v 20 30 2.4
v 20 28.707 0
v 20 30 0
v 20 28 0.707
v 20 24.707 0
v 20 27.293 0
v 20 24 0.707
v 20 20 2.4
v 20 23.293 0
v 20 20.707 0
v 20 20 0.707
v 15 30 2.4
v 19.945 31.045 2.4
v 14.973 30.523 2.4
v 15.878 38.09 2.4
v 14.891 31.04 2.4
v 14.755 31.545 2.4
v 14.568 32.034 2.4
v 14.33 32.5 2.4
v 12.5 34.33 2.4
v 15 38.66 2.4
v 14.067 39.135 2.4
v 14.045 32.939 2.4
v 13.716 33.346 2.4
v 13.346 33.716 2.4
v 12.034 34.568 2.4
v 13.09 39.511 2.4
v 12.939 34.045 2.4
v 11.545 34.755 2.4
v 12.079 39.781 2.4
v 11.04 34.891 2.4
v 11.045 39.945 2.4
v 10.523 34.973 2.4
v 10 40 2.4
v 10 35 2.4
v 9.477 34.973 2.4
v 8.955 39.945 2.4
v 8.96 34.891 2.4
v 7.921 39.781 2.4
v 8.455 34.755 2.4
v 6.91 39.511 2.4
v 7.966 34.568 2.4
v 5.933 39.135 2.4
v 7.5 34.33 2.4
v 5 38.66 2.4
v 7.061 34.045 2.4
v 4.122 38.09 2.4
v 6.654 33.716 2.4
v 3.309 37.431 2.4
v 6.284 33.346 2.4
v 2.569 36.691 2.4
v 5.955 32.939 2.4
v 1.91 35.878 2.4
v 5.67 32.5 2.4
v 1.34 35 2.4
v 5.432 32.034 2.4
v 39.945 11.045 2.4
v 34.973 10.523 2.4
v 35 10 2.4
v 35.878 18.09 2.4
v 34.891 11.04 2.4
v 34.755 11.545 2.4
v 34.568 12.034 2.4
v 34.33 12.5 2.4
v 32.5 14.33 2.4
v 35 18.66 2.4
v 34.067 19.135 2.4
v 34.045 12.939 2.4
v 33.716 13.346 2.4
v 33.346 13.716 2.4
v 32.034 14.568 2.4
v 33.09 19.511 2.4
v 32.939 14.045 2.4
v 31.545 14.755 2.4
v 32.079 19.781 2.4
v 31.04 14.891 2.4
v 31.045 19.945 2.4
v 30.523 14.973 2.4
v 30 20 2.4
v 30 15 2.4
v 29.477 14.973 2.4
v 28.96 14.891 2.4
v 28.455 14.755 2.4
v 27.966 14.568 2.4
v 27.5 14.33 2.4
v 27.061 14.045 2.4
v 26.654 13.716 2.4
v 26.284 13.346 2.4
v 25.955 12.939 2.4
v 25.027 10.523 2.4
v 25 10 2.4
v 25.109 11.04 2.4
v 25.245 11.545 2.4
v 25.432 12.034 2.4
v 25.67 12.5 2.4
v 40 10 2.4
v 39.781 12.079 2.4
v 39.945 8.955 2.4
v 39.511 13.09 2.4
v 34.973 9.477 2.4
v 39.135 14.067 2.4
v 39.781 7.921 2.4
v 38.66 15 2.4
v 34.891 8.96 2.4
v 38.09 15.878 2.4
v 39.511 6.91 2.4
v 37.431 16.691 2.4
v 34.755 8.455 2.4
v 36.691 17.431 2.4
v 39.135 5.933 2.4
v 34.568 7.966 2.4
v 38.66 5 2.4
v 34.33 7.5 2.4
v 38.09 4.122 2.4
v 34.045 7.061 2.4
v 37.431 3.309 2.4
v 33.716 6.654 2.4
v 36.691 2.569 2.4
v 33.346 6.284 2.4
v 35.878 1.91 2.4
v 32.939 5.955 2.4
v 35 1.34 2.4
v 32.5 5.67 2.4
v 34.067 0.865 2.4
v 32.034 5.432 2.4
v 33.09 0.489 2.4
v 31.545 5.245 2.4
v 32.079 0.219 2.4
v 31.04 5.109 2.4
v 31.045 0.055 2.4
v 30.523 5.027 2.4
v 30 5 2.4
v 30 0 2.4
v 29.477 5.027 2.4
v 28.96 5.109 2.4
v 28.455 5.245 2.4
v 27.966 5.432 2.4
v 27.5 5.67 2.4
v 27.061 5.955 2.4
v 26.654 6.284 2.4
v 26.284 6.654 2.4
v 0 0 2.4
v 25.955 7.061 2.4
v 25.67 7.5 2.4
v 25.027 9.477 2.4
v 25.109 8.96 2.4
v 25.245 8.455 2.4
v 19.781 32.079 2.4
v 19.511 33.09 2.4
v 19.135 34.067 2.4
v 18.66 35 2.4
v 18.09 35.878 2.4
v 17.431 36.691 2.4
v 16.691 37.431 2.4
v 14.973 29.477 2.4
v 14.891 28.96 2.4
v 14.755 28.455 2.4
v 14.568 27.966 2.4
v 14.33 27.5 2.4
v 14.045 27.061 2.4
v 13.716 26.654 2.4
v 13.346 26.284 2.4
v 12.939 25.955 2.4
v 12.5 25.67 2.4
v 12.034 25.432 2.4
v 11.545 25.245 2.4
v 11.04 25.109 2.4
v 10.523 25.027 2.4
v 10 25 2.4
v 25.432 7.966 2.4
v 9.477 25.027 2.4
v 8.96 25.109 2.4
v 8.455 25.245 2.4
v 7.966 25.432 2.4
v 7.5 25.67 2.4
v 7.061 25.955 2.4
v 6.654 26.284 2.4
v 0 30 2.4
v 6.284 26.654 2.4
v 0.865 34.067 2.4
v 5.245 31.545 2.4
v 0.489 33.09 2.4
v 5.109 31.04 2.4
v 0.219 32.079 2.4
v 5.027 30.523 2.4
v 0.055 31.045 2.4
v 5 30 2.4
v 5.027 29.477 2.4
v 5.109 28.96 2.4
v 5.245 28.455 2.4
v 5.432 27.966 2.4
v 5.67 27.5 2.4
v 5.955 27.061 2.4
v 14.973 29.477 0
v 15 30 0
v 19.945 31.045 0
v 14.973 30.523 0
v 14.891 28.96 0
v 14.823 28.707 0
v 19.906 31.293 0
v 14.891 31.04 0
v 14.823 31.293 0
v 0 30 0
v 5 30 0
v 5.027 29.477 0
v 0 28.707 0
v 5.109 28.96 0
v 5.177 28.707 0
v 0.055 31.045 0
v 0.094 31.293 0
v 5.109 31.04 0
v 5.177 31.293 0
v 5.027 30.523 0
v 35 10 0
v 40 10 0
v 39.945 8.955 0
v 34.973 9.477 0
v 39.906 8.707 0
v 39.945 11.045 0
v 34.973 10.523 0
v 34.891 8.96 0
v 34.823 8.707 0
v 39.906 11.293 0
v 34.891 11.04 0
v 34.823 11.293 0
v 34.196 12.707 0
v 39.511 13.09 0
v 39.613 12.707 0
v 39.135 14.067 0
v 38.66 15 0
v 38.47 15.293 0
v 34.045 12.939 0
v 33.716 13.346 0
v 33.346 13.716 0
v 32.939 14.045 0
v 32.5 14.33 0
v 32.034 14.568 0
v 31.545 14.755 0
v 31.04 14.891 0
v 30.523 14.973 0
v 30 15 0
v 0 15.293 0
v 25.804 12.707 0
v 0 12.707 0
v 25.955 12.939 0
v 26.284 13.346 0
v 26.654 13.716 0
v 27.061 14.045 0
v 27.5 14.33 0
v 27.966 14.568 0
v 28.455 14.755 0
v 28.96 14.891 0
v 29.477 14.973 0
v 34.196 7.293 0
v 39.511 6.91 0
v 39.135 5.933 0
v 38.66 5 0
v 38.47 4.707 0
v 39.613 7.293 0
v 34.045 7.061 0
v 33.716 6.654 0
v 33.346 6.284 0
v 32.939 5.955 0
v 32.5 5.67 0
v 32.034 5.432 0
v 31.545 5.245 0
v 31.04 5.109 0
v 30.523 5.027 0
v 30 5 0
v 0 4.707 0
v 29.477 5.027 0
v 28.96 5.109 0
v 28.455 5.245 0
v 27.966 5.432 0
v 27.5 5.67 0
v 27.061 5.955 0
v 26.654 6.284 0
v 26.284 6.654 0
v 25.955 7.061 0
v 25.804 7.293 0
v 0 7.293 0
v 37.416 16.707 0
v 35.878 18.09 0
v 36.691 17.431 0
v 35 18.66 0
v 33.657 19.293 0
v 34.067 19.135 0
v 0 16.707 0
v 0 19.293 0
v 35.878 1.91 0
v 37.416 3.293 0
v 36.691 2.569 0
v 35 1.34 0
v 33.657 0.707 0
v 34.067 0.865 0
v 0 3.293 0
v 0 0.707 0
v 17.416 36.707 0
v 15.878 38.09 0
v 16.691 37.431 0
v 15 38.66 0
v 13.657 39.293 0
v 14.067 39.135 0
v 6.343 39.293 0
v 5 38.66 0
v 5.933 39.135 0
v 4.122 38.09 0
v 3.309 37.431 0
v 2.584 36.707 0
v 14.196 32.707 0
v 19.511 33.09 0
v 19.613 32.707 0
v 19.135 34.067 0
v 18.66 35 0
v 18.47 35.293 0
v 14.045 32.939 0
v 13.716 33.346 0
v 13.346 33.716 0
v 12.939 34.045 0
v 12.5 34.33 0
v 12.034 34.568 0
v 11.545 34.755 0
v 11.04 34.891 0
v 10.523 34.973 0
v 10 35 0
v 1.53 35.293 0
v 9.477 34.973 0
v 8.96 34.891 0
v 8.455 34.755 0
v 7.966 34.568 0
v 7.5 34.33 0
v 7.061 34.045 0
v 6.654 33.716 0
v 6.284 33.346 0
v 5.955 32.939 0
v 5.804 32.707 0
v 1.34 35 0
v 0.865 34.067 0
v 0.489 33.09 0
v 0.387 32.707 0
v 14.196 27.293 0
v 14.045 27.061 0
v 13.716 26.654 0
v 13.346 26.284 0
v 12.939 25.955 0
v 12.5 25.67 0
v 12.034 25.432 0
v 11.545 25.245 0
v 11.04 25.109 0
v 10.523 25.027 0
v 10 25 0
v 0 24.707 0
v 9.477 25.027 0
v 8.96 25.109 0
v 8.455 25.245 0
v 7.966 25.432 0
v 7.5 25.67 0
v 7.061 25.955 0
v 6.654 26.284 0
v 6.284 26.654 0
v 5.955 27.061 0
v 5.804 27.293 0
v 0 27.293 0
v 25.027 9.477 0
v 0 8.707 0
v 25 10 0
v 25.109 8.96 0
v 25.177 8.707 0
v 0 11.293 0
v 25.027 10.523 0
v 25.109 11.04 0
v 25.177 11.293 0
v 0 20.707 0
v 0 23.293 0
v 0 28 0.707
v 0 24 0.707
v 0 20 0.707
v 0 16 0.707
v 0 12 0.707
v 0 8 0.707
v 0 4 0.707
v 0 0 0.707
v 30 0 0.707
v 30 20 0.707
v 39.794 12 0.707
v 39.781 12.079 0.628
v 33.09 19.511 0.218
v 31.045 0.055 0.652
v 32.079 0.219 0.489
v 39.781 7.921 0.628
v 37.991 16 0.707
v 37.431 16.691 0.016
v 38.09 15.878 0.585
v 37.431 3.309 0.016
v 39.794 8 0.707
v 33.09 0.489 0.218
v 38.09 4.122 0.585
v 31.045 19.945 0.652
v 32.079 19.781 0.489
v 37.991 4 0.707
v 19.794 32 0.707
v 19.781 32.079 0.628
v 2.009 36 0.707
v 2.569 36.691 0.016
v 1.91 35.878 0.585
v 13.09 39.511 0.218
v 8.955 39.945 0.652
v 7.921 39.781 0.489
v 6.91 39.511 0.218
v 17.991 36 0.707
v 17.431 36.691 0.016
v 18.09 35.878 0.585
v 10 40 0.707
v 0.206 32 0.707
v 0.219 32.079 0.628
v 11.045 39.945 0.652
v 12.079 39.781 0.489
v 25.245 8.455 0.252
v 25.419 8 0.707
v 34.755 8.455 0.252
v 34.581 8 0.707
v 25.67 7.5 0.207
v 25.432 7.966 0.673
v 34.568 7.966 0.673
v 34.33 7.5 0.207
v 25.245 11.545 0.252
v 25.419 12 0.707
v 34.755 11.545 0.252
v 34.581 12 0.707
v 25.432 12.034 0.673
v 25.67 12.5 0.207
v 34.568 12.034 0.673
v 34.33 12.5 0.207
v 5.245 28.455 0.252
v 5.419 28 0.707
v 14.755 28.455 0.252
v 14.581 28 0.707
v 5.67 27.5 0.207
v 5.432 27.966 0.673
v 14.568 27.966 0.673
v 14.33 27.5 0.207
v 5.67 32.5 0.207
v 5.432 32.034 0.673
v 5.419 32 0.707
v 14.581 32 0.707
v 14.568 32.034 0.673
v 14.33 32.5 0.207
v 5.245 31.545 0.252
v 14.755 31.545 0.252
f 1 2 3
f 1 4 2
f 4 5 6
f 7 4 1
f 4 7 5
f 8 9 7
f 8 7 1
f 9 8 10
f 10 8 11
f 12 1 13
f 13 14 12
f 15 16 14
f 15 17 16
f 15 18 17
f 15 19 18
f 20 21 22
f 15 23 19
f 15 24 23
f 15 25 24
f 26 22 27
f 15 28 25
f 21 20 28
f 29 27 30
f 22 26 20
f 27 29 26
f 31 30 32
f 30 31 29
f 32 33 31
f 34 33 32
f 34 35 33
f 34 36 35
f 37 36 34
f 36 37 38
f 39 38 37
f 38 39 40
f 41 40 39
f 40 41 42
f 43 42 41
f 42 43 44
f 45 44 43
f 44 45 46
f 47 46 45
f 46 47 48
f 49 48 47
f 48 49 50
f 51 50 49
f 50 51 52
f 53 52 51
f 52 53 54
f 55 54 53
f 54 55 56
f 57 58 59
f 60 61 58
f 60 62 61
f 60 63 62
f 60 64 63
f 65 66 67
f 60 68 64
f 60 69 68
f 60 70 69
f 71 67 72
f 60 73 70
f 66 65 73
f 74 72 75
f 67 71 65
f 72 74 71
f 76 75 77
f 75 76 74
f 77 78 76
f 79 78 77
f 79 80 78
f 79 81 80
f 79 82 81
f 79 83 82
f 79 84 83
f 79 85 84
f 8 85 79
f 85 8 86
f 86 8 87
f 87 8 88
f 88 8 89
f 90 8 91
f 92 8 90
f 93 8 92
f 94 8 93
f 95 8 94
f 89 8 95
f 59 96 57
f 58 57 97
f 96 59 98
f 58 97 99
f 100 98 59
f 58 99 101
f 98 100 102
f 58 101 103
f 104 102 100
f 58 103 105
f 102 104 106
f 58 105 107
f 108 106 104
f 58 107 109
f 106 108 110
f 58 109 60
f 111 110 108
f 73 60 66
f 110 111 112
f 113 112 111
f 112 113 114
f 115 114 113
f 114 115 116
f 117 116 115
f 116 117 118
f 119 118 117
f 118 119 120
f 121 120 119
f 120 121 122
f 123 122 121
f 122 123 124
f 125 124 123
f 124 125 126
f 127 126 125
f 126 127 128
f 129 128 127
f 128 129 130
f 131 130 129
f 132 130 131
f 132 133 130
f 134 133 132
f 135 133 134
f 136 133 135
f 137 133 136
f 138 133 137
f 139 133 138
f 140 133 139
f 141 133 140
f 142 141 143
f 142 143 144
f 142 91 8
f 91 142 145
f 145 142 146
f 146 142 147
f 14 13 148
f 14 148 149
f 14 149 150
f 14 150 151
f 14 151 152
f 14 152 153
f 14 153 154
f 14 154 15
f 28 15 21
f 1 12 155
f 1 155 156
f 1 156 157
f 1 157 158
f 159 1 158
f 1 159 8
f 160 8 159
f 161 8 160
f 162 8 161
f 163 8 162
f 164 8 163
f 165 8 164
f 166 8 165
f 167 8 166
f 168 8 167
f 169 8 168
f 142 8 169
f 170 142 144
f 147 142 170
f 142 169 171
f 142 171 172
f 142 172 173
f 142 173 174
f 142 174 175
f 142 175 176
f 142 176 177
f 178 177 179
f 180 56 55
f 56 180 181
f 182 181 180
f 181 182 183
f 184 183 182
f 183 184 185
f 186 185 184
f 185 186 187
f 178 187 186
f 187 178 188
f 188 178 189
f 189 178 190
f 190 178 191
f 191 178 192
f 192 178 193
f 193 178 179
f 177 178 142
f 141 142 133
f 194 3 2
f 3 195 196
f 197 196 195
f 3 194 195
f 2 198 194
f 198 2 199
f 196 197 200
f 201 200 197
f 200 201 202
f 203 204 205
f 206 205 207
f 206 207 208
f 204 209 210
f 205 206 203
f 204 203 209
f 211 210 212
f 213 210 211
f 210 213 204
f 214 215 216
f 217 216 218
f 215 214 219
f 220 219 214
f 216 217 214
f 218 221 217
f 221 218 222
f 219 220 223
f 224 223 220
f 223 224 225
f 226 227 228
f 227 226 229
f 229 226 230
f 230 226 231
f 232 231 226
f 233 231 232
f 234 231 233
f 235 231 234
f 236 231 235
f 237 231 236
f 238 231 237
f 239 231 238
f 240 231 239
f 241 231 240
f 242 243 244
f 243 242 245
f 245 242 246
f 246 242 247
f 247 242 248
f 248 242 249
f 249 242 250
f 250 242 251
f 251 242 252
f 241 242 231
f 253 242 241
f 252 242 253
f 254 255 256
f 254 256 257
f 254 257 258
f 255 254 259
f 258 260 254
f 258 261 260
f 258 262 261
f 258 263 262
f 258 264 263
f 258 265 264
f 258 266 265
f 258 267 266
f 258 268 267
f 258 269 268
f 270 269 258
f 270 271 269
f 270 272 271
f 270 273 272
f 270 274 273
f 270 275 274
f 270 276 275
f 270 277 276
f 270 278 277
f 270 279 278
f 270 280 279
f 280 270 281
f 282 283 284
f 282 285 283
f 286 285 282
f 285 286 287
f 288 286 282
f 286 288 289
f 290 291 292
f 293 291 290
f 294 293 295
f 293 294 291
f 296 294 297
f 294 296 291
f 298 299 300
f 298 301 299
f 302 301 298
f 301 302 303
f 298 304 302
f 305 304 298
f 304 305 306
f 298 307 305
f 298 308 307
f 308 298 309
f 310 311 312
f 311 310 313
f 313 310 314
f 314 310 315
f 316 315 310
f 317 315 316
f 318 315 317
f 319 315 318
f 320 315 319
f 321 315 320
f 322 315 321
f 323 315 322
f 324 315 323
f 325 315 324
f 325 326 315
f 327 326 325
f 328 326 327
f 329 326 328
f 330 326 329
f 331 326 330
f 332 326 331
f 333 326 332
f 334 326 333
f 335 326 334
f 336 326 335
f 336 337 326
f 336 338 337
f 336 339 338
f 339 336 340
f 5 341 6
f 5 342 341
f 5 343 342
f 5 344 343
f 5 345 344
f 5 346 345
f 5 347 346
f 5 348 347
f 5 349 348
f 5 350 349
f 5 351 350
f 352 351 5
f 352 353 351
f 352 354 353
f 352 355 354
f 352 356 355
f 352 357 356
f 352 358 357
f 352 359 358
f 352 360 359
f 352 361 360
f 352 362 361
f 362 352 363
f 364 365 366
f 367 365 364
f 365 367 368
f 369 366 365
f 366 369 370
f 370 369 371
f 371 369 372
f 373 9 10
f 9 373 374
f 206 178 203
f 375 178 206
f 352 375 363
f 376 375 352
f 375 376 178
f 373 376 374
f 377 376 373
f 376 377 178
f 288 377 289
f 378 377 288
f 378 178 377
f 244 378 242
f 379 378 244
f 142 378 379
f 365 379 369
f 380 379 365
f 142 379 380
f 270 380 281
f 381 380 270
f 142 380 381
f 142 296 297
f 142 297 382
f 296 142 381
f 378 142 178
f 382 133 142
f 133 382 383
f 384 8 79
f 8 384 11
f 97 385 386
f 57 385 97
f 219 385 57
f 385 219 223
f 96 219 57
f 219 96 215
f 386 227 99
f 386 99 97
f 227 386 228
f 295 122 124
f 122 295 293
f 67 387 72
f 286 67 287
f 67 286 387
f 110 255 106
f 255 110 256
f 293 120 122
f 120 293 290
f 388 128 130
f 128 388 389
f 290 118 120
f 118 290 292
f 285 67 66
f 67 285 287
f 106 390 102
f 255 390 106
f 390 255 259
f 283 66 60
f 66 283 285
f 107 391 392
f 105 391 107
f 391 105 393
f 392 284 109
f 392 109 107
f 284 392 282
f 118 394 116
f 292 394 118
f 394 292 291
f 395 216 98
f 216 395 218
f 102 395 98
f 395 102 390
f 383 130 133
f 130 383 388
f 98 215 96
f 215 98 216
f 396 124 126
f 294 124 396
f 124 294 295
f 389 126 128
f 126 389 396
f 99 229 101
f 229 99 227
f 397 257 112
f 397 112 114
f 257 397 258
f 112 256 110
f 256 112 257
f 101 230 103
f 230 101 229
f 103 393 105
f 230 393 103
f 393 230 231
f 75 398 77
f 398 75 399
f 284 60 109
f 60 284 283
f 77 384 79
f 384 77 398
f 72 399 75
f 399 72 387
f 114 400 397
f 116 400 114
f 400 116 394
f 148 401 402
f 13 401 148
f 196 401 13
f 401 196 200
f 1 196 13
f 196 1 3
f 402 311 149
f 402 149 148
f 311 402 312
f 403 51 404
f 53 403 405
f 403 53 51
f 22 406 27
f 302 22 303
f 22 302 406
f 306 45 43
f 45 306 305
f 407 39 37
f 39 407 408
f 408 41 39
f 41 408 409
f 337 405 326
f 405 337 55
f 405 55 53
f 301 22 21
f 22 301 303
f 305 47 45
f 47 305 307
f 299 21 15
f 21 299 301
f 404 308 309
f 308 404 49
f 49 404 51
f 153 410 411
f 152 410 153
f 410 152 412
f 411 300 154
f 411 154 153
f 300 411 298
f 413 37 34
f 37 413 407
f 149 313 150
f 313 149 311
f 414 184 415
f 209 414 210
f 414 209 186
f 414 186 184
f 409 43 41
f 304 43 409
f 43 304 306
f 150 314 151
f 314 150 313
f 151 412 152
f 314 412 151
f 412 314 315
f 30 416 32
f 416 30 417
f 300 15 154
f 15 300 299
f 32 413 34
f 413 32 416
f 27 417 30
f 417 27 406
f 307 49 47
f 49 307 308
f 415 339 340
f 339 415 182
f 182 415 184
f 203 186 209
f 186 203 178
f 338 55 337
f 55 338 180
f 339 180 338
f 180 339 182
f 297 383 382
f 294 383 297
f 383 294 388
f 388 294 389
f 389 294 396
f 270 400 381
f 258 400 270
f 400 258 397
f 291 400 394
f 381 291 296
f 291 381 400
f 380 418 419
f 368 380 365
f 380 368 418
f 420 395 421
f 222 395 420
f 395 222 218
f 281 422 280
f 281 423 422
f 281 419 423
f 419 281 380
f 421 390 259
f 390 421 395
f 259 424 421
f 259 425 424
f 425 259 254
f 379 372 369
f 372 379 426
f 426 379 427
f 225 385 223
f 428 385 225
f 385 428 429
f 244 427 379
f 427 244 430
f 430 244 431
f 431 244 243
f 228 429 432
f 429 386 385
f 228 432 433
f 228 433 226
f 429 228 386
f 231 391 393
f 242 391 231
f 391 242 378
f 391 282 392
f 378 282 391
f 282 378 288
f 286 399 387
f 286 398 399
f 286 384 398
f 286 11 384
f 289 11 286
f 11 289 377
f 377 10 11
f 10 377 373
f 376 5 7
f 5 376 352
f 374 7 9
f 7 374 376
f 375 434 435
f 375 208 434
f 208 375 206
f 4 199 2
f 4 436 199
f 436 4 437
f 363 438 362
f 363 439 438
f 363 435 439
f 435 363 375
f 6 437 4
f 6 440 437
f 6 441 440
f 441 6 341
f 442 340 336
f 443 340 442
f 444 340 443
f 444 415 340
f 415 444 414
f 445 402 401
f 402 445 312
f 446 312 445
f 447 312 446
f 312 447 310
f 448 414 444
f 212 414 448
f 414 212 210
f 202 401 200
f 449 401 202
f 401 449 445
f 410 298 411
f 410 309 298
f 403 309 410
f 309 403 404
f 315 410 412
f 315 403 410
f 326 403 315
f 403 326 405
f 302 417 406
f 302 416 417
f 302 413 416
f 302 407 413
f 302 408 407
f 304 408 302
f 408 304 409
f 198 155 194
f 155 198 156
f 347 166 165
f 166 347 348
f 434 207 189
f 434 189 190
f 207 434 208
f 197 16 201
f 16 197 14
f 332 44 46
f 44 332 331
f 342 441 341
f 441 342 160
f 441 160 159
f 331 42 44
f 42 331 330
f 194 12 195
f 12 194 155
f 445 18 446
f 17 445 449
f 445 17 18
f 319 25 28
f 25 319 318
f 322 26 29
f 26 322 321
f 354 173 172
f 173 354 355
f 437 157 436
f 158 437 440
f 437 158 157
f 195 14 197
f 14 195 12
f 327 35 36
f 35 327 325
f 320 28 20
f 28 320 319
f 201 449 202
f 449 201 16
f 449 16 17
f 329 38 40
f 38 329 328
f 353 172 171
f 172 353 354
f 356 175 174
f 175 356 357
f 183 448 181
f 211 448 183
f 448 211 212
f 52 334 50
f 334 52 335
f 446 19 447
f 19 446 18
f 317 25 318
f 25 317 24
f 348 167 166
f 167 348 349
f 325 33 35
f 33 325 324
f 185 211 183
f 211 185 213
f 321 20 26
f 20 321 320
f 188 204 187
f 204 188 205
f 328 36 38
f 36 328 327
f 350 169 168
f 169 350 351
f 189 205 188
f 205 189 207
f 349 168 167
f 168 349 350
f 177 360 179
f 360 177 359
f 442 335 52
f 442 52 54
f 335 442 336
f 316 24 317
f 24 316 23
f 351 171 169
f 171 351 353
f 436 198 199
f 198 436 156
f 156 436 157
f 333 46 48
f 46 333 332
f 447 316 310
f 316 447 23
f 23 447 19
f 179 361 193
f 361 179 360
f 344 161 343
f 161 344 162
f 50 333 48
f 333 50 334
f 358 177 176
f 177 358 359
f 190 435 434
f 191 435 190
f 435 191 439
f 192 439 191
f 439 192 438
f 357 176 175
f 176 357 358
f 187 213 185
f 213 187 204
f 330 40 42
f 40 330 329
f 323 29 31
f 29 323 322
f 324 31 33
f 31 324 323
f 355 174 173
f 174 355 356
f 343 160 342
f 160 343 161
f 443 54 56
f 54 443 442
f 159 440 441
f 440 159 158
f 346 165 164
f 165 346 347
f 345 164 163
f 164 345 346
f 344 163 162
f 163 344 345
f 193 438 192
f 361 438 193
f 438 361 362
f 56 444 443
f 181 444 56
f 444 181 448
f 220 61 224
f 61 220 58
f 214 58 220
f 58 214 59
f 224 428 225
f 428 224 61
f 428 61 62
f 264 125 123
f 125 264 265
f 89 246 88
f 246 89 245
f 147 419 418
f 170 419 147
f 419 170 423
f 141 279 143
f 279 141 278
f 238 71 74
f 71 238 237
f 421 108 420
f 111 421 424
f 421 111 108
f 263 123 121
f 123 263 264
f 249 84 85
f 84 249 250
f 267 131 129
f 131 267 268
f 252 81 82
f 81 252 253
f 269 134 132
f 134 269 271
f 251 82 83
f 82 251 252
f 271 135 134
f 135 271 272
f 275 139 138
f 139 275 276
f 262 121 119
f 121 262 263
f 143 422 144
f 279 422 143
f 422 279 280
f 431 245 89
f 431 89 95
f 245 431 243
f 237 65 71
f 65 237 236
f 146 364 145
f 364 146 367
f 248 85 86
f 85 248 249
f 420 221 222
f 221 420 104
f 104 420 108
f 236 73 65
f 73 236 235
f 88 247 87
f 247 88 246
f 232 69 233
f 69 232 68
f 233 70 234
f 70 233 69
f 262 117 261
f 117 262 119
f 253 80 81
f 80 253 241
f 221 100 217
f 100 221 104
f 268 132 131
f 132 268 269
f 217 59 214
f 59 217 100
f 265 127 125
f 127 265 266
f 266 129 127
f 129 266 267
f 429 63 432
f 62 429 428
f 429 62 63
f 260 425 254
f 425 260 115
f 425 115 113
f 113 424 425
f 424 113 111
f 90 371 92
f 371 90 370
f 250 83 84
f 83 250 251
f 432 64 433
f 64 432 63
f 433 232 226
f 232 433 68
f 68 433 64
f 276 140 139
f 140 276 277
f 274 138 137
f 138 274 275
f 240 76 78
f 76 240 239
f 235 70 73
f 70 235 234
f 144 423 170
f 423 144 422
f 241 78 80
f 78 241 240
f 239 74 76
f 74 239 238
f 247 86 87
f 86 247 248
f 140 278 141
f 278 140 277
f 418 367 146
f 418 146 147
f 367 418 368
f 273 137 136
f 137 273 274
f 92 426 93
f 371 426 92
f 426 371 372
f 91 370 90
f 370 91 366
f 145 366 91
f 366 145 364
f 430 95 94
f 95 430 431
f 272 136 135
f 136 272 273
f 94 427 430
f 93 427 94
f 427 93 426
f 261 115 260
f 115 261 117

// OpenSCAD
//figuras para representar en escala
height = 2.4;
//matriz para a separacion fácil
sep = 4;

//maiúscula L
module capitalL(side){
    difference(){
    union(){
    cube([side,2*side,height]);
    cube([3*side,side,height]);
    }
    for (i=[0:sep:2*side]){
    translate([0,i,-sin(45)]) rotate([45,0,0]) cube([3*side,1,1]);
}
}
}

//unha U
module capitalU(side){
    difference(){
    union(){
    cube([side,2*side,height]);
    cube([3*side,side,height]);
    translate([2*side,0,0]) cube([side,2*side,height]);
    }
    for (i=[0:sep:2*side]){
    translate([0,i,-sin(45)]) rotate([45,0,0]) cube([3*side,1,1]);
}
}
}
module shape01(side){
    difference(){
    cube([3*side,2*side,height]);
    translate([side,side,0]) cube([side,2*side,height]);
    translate([side,side,0]) rotate([0,0,45]) cube([side,2*side,height]);
    for (i=[0:sep:2*side]){
    translate([0,i,-sin(45)]) rotate([45,0,0]) cube([3*side,1,1]);
}
}
}
module shape02(side){
    difference(){
    linear_extrude(height) {polygon(points = [[0,0],[3*side,0],[3*side,2*side],[side,side],[0,2*side]]);
    }
    for (i=[0:sep:2*side]){
    translate([0,i,-sin(45)]) rotate([45,0,0]) cube([3*side,1,1]);
    }
}
}


module curves01(side){
    difference(){
        union(){
    cube([side,2*side,height]);
    translate([side,side,0]) cylinder(r=side,h=height,$fn=60);
        }
        for (i=[0:sep:2*side]){
    translate([0,i,-sin(45)]) rotate([45,0,0]) cube([3*side,1,1]);
    }
}
}
module curves02(side){
    difference(){
        union(){
    cube([3*side,side,height]);
    translate ([2*side,side,0]) cylinder(r=side,h=height,$fn=60);
        }
        translate ([2*side,side,0]) cylinder(r=side/2,h=height,$fn=60);
         for (i=[0:sep:2*side]){
    translate([0,i,-sin(45)]) rotate([45,0,0]) cube([3*side,1,1]);
    }
       
    }
}
module curves03(side){
    difference(){
    cube([3*side,2*side,height]);
       translate([0,2*side,0]) cylinder(r=side,h=height, $fn=40);
        translate([2*side,side,0]) cube([side,side,height]);
    for (i=[0:sep:2*side]){
    translate([0,i,-sin(45)]) rotate([45,0,0]) cube([3*side,1,1]);
    }
}
}
module curves04(side){
    difference(){
        union(){
    translate ([side,0,0])cube([side,2*side,height]);
    translate ([side,side,0]) cylinder(r=side,h=height,$fn=60);
    translate ([2*side,side,0]) cylinder(r=side,h=height,$fn=60);
        }
        translate ([side,side,0]) cylinder(r=side/2,h=height,$fn=60);
        translate ([side,side,0]) cylinder(r=side/2,h=height,$fn=60);
         for (i=[0:sep:2*side]){
    translate([0,i,-sin(45)]) rotate([45,0,0]) cube([3*side,1,1]);
    }
       
    }
    
}
module curves05(side){
    difference(){
        union(){
    translate ([side,0,0])cube([side,2*side,height]);
    translate ([side,side,0]) cylinder(r=side,h=height,$fn=60);
    translate ([2*side,side,0]) cylinder(r=side,h=height,$fn=60);
        }
        translate ([side,side,0]) cylinder(r=side/2,h=height,$fn=60);
        #translate ([2*side,side,0]) cylinder(r=side/4,h=height,$fn=60);
         for (i=[0:sep:2*side]){
    translate([0,i,-sin(45)]) rotate([45,0,0]) cube([3*side,1,1]);
    }
       
    }
    
}
module curves06(side){
    difference(){
        union(){
    cube([side,1.5*side,height]);
    cube([1.5*side,side,height]);
    translate ([1.5*side,side/2,0]) cylinder(r=side/2,h=height,$fn=60);
    translate ([side/2,1.5*side,0]) cylinder(r=side/2,h=height,$fn=60);
        }
        translate ([side/2,1.5*side,0]) cylinder(r=side/4,h=height,$fn=60);
        translate ([1.5*side,side/2,0]) cylinder(r=side/4,h=height,$fn=60);
         for (i=[0:sep:2*side]){
    translate([0,i,-sin(45)]) rotate([45,0,0]) cube([3*side,1,1]);
    }
       
    }
    
}
//capitalL(10);
//capitalU(20);
curves06(20);
